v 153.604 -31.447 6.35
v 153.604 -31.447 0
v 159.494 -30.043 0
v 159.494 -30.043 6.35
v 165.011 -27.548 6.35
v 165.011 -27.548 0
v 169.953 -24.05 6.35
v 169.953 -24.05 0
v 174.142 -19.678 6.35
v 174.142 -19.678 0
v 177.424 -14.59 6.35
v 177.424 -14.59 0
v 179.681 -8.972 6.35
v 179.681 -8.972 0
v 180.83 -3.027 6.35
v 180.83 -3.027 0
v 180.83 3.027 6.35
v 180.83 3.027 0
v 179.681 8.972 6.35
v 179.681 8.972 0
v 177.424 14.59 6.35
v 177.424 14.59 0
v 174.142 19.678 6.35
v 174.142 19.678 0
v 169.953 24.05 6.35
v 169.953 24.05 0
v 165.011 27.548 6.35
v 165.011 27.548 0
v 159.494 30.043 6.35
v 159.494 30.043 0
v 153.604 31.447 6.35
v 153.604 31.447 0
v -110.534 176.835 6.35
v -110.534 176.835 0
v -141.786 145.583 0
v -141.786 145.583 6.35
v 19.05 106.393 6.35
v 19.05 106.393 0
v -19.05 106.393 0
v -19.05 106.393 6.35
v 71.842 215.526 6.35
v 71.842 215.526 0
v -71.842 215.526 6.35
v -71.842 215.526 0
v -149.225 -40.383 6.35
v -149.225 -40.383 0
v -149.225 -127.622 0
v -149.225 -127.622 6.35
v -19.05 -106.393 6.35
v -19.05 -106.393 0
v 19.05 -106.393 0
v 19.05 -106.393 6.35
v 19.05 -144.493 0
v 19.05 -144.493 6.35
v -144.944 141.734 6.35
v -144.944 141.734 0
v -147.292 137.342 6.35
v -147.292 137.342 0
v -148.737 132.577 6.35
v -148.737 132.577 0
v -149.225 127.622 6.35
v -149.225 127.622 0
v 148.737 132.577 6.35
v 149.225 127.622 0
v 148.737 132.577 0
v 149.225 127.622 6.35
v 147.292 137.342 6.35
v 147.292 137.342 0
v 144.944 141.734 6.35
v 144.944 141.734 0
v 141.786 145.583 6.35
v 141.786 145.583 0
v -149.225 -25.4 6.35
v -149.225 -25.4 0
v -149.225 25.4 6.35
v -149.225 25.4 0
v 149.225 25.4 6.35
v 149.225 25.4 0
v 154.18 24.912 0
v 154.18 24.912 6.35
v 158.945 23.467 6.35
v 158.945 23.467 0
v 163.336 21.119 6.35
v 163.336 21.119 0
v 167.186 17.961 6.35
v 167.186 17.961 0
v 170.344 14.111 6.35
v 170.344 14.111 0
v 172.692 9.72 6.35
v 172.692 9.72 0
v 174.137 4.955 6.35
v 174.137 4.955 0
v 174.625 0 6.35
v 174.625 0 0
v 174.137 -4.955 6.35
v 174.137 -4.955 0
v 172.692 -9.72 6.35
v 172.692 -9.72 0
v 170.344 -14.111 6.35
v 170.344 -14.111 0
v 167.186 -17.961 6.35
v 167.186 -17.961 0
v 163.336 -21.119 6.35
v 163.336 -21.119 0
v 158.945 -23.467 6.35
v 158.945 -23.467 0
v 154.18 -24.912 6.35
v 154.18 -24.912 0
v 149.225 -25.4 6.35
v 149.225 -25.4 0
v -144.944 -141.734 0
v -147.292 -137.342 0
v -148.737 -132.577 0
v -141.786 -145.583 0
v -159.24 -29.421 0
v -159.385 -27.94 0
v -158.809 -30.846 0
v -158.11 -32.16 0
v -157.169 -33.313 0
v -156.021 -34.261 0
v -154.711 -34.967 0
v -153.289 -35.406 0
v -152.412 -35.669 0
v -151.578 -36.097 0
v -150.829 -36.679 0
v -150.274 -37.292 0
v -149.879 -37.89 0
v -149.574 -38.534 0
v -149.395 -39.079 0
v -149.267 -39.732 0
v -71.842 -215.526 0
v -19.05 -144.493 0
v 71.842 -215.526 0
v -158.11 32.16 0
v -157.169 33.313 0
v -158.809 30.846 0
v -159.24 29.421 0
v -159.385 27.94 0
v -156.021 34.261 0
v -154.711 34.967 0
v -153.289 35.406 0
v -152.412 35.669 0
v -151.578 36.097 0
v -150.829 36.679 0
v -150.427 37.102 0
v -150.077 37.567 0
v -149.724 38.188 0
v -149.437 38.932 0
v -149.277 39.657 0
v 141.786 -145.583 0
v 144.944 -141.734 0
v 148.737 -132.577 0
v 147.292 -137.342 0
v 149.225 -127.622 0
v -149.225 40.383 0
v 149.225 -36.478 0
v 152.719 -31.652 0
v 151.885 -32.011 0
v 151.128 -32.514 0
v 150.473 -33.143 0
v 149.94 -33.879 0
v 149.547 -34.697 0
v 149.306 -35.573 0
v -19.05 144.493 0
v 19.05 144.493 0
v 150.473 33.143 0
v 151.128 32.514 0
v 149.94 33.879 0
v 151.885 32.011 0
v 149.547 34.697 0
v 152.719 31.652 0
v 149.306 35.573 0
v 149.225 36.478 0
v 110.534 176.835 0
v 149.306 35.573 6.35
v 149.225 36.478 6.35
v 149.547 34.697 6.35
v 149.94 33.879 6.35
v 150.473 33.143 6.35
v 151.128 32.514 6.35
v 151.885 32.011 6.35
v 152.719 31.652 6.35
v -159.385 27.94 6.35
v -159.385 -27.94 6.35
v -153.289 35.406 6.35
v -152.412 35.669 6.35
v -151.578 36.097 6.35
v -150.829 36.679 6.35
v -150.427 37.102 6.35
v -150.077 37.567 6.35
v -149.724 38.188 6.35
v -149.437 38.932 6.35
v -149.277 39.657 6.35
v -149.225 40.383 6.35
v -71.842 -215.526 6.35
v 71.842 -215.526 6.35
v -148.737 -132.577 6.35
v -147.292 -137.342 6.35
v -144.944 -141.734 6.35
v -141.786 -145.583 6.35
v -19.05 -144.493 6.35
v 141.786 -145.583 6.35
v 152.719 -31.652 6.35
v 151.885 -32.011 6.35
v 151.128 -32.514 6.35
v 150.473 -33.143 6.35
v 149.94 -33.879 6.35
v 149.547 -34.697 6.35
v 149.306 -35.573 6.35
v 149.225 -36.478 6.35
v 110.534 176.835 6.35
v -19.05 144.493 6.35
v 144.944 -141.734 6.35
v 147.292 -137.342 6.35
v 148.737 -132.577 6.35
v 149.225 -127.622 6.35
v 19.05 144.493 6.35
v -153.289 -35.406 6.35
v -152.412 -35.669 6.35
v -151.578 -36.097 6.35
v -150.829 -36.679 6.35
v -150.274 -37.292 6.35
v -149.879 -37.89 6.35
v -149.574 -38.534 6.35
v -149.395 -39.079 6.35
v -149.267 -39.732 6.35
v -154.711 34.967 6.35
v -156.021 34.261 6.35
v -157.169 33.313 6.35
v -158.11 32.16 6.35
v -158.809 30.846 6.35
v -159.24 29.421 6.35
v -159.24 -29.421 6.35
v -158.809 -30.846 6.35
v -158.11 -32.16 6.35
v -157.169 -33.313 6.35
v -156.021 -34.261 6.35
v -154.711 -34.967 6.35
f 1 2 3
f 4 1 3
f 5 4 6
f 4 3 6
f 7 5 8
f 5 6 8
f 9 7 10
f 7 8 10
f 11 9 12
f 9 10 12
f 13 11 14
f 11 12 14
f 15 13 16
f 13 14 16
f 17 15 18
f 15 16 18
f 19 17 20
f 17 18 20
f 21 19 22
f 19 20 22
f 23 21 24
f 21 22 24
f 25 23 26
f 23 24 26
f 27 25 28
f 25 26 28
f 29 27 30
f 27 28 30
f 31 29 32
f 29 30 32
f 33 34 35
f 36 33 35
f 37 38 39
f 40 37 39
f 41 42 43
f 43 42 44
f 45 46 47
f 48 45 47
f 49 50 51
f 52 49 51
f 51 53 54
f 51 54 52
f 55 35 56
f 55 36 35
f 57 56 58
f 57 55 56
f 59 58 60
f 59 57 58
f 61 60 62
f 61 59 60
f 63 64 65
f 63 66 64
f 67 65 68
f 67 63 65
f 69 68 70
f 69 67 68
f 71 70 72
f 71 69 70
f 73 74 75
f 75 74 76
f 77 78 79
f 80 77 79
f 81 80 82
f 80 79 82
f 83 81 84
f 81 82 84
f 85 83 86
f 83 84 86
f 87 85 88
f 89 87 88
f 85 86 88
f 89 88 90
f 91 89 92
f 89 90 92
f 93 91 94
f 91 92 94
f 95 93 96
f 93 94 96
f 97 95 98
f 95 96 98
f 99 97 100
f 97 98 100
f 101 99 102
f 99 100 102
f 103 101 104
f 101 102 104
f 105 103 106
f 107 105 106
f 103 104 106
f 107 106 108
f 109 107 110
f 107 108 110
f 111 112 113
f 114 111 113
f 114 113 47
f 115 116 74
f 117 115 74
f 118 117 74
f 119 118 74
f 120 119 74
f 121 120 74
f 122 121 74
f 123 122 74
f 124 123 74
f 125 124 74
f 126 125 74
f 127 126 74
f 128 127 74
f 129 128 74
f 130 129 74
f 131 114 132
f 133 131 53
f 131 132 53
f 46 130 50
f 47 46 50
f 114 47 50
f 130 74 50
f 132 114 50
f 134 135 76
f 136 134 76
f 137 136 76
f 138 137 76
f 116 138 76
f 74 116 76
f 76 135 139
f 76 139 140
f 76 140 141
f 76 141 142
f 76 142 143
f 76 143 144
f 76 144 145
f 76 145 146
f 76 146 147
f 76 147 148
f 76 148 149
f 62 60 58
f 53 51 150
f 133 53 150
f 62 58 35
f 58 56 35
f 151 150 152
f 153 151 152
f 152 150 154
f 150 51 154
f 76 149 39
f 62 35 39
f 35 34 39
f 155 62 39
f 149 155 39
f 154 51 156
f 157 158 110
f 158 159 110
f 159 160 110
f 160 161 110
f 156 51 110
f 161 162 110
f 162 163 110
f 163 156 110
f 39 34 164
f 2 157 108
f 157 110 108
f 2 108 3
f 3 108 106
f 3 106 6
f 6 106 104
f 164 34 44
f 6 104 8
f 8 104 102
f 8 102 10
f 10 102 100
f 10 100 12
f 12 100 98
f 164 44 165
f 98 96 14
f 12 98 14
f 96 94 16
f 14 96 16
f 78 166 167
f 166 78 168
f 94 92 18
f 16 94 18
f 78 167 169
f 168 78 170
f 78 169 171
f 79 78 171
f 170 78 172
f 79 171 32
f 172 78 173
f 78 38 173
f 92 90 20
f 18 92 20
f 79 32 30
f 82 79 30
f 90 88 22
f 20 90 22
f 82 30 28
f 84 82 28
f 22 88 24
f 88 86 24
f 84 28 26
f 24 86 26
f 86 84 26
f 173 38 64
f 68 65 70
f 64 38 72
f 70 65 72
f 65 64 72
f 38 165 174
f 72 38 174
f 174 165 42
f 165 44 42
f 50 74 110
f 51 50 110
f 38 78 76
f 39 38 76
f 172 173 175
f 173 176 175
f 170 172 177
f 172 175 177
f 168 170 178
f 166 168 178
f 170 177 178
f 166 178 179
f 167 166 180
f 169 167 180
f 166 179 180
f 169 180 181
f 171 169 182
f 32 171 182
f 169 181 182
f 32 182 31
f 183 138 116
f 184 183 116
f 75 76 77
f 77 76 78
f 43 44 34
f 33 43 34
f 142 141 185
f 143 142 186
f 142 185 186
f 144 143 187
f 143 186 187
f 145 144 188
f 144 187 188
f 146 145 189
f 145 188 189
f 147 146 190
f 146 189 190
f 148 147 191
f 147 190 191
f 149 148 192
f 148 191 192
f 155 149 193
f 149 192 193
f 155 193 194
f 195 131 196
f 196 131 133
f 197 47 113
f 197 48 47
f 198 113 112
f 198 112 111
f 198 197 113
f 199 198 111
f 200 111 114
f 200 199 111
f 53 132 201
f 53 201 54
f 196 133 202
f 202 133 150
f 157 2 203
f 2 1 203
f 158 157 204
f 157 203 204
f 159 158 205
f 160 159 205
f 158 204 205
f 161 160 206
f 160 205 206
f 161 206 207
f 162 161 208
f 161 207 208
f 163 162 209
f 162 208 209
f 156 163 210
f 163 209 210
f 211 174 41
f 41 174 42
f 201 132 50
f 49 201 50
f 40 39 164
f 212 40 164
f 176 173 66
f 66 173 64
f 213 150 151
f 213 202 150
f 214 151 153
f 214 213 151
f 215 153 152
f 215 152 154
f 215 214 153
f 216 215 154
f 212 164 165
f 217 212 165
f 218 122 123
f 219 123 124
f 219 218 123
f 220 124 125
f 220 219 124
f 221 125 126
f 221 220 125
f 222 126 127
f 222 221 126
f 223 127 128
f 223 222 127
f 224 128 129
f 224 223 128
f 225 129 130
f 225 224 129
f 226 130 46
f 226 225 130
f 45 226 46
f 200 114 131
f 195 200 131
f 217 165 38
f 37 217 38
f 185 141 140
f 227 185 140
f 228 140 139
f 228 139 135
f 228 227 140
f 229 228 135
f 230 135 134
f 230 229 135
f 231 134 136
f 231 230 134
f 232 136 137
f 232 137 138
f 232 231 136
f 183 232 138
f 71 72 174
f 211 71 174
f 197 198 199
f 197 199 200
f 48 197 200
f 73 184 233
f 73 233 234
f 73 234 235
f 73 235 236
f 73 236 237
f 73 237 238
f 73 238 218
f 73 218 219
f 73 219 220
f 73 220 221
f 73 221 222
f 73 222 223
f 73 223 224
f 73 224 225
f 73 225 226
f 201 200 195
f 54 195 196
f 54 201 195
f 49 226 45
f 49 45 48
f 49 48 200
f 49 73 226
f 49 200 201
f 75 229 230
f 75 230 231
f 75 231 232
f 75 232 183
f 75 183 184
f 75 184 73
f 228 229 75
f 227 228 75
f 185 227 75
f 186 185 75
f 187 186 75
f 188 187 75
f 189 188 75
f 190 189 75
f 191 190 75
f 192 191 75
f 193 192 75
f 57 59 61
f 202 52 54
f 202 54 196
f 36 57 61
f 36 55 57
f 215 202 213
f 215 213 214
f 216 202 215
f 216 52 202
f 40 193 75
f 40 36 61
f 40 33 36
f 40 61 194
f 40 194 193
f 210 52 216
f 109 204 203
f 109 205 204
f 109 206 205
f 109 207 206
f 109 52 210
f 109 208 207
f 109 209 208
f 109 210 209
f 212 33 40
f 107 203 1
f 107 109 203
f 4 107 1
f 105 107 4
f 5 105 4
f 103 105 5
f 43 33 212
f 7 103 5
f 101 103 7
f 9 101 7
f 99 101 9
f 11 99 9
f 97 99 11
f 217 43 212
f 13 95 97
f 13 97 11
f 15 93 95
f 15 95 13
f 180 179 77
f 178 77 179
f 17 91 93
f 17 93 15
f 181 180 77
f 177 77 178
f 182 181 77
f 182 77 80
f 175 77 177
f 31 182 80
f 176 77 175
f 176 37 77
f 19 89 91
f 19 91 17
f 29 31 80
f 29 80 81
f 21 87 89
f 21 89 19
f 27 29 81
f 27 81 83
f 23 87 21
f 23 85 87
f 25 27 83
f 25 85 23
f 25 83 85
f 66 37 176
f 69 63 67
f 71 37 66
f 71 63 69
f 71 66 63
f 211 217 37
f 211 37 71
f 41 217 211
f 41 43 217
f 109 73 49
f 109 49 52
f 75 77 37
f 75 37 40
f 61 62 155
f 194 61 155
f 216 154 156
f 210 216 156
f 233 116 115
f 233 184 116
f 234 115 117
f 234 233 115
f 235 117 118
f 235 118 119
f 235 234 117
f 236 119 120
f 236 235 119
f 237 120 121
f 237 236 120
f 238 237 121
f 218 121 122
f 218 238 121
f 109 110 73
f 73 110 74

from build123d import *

# Parameters (mm, degrees)
F0_R     = 3.175
F0_W     = 38.1
F0_H     = 38.1
F1_DEPTH = 6.35
F2_R     = 25.4
F3_R     = 5.08
F4_R     = 7.62
F5_R     = 5.08


with BuildPart() as f1:
    # F0 (on Top) → F1 (new body)
    with BuildSketch(Plane.XY):
        Polygon((149.225, -25.4), (-149.225, -25.4), (-149.225, -35.56), (-149.225, -138.1431958742), (-71.8420489686, -215.5261469057), (71.8420489686, -215.5261469057), (149.225, -138.1431958742), (149.225, -31.75), align=None)
        with Locations((-101.55326548, -167.8544181521)):
            Circle(F0_R, mode=Mode.SUBTRACT)
        with Locations((-50.799996416, -157.1931958742)):
            Circle(F0_R, mode=Mode.SUBTRACT)
        with Locations((-130.175, -125.4431958742)):
            Circle(F0_R, mode=Mode.SUBTRACT)
        with Locations((0, -125.4431958742)):
            Rectangle(F0_W, F0_H, mode=Mode.SUBTRACT)
        with Locations((-50.799996416, -93.6931958742)):
            Circle(F0_R, mode=Mode.SUBTRACT)
        with Locations((-50.165, -63.5)):
            Circle(F0_R, mode=Mode.SUBTRACT)
        with Locations((50.799996416, -157.1931958742)):
            Circle(F0_R, mode=Mode.SUBTRACT)
        with Locations((101.5532683632, -167.8544152689)):
            Circle(F0_R, mode=Mode.SUBTRACT)
        with Locations((50.799996416, -93.6931958742)):
            Circle(F0_R, mode=Mode.SUBTRACT)
        with Locations((130.175, -125.4431958742)):
            Circle(F0_R, mode=Mode.SUBTRACT)
        with Locations((50.165, -63.5)):
            Circle(F0_R, mode=Mode.SUBTRACT)
        Polygon((-149.225, 35.56), (-149.225, 25.4), (149.225, 25.4), (149.225, 31.75), (149.225, 138.1431958742), (110.5335244843, 176.8346713899), (71.8420489686, 215.5261469057), (-71.8420489686, 215.5261469057), (-110.5335216011, 176.8346742731), (-149.225, 138.1431958742), align=None)
        with Locations((-50.165, 63.5)):
            Circle(F0_R, mode=Mode.SUBTRACT)
        with Locations((-130.175, 125.4431958742)):
            Circle(F0_R, mode=Mode.SUBTRACT)
        with Locations((-50.799996416, 93.6931958742)):
            Circle(F0_R, mode=Mode.SUBTRACT)
        Polygon((0, 106.3931958742), (-19.05, 106.3931958742), (-19.05, 144.4931958742), (19.05, 144.4931958742), (19.05, 106.3931958742), align=None, mode=Mode.SUBTRACT)
        with BuildLine():
            ThreePointArc((-98.37826548, 167.8544181521), (-102.7682853778, 164.9211006363), (-103.7983295103, 170.0994821823))
            ThreePointArc((-103.7983295103, 170.0994821823), (-100.3382455823, 170.7877356678), (-98.37826548, 167.8544181521))
        make_face(mode=Mode.SUBTRACT)
        with Locations((-50.799996416, 157.1931958742)):
            Circle(F0_R, mode=Mode.SUBTRACT)
        with Locations((50.165, 63.5)):
            Circle(F0_R, mode=Mode.SUBTRACT)
        with Locations((50.799996416, 93.6931958742)):
            Circle(F0_R, mode=Mode.SUBTRACT)
        with Locations((130.175, 125.4431958742)):
            Circle(F0_R, mode=Mode.SUBTRACT)
        with Locations((50.799996416, 157.1931958742)):
            Circle(F0_R, mode=Mode.SUBTRACT)
        with BuildLine():
            ThreePointArc((104.7282683632, 167.8544152689), (98.6199508475, 166.6393953711), (103.7983323935, 170.0994792991))
            ThreePointArc((103.7983323935, 170.0994792991), (104.4865858789, 169.0694351666), (104.7282683632, 167.8544152689))
        make_face(mode=Mode.SUBTRACT)
        Polygon((-149.225, -35.56), (-149.225, -25.4), (-149.225, 25.4), (-149.225, 35.56), (-159.385, 35.56), (-159.385, -35.56), align=None)
        with BuildLine():
            ThreePointArc((149.225, 25.4), (174.625, 0), (149.225, -25.4))
            Line((149.225, -25.4), (149.225, -31.75))
            ThreePointArc((149.225, -31.75), (180.975, 0), (149.225, 31.75))
            Line((149.225, 31.75), (149.225, 25.4))
        make_face()
        with Locations((-130.175, -125.4431958742)):
            Circle(F0_R)
        with Locations((-101.55326548, -167.8544181521)):
            Circle(F0_R)
        with Locations((-50.165, -63.5)):
            Circle(F0_R)
        with Locations((-50.799996416, -93.6931958742)):
            Circle(F0_R)
        with Locations((-50.799996416, -157.1931958742)):
            Circle(F0_R)
        with Locations((50.165, -63.5)):
            Circle(F0_R)
        with Locations((50.799996416, -93.6931958742)):
            Circle(F0_R)
        with Locations((50.799996416, -157.1931958742)):
            Circle(F0_R)
        with Locations((101.5532683632, -167.8544152689)):
            Circle(F0_R)
        with Locations((130.175, -125.4431958742)):
            Circle(F0_R)
        with Locations((-130.175, 125.4431958742)):
            Circle(F0_R)
        with Locations((-50.799996416, 93.6931958742)):
            Circle(F0_R)
        with Locations((-50.165, 63.5)):
            Circle(F0_R)
        with Locations((50.165, 63.5)):
            Circle(F0_R)
        with Locations((50.799996416, 93.6931958742)):
            Circle(F0_R)
        with Locations((50.799996416, 157.1931958742)):
            Circle(F0_R)
        with Locations((-50.799996416, 157.1931958742)):
            Circle(F0_R)
        with BuildLine():
            ThreePointArc((-98.37826548, 167.8544181521), (-100.3382455823, 170.7877356678), (-103.7983295103, 170.0994821823))
            ThreePointArc((-103.7983295103, 170.0994821823), (-102.7682853778, 164.9211006363), (-98.37826548, 167.8544181521))
        make_face()
        with BuildLine():
            ThreePointArc((104.7282683632, 167.8544152689), (104.4865858789, 169.0694351666), (103.7983323935, 170.0994792991))
            ThreePointArc((103.7983323935, 170.0994792991), (98.6199508475, 166.6393953711), (104.7282683632, 167.8544152689))
        make_face()
        with Locations((130.175, 125.4431958742)):
            Circle(F0_R)
    extrude(amount=F1_DEPTH)

    # F2
    f2_edges = [f1.edges().sort_by_distance(p)[0] for p in [
        (149.225, -138.143196, 3.175),
        (-149.225, -138.143196, 3.175),
        (149.225, 138.143196, 3.175),
        (-149.225, 138.143196, 3.175),
    ]]
    fillet(f2_edges, radius=F2_R)

    # F3
    f3_edges = [f1.edges().sort_by_distance(p)[0] for p in [
        (149.225, -31.75, 3.175),
        (149.225, 31.75, 3.175),
    ]]
    fillet(f3_edges, radius=F3_R)

    # F4
    f4_edges = [f1.edges().sort_by_distance(p)[0] for p in [
        (-159.385, -35.56, 3.175),
        (-159.385, 35.56, 3.175),
    ]]
    fillet(f4_edges, radius=F4_R)

    # F5
    f5_edges = [f1.edges().sort_by_distance(p)[0] for p in [
        (-149.225, -35.56, 3.175),
        (-149.225, 35.56, 3.175),
    ]]
    fillet(f5_edges, radius=F5_R)


solid = f1.part
